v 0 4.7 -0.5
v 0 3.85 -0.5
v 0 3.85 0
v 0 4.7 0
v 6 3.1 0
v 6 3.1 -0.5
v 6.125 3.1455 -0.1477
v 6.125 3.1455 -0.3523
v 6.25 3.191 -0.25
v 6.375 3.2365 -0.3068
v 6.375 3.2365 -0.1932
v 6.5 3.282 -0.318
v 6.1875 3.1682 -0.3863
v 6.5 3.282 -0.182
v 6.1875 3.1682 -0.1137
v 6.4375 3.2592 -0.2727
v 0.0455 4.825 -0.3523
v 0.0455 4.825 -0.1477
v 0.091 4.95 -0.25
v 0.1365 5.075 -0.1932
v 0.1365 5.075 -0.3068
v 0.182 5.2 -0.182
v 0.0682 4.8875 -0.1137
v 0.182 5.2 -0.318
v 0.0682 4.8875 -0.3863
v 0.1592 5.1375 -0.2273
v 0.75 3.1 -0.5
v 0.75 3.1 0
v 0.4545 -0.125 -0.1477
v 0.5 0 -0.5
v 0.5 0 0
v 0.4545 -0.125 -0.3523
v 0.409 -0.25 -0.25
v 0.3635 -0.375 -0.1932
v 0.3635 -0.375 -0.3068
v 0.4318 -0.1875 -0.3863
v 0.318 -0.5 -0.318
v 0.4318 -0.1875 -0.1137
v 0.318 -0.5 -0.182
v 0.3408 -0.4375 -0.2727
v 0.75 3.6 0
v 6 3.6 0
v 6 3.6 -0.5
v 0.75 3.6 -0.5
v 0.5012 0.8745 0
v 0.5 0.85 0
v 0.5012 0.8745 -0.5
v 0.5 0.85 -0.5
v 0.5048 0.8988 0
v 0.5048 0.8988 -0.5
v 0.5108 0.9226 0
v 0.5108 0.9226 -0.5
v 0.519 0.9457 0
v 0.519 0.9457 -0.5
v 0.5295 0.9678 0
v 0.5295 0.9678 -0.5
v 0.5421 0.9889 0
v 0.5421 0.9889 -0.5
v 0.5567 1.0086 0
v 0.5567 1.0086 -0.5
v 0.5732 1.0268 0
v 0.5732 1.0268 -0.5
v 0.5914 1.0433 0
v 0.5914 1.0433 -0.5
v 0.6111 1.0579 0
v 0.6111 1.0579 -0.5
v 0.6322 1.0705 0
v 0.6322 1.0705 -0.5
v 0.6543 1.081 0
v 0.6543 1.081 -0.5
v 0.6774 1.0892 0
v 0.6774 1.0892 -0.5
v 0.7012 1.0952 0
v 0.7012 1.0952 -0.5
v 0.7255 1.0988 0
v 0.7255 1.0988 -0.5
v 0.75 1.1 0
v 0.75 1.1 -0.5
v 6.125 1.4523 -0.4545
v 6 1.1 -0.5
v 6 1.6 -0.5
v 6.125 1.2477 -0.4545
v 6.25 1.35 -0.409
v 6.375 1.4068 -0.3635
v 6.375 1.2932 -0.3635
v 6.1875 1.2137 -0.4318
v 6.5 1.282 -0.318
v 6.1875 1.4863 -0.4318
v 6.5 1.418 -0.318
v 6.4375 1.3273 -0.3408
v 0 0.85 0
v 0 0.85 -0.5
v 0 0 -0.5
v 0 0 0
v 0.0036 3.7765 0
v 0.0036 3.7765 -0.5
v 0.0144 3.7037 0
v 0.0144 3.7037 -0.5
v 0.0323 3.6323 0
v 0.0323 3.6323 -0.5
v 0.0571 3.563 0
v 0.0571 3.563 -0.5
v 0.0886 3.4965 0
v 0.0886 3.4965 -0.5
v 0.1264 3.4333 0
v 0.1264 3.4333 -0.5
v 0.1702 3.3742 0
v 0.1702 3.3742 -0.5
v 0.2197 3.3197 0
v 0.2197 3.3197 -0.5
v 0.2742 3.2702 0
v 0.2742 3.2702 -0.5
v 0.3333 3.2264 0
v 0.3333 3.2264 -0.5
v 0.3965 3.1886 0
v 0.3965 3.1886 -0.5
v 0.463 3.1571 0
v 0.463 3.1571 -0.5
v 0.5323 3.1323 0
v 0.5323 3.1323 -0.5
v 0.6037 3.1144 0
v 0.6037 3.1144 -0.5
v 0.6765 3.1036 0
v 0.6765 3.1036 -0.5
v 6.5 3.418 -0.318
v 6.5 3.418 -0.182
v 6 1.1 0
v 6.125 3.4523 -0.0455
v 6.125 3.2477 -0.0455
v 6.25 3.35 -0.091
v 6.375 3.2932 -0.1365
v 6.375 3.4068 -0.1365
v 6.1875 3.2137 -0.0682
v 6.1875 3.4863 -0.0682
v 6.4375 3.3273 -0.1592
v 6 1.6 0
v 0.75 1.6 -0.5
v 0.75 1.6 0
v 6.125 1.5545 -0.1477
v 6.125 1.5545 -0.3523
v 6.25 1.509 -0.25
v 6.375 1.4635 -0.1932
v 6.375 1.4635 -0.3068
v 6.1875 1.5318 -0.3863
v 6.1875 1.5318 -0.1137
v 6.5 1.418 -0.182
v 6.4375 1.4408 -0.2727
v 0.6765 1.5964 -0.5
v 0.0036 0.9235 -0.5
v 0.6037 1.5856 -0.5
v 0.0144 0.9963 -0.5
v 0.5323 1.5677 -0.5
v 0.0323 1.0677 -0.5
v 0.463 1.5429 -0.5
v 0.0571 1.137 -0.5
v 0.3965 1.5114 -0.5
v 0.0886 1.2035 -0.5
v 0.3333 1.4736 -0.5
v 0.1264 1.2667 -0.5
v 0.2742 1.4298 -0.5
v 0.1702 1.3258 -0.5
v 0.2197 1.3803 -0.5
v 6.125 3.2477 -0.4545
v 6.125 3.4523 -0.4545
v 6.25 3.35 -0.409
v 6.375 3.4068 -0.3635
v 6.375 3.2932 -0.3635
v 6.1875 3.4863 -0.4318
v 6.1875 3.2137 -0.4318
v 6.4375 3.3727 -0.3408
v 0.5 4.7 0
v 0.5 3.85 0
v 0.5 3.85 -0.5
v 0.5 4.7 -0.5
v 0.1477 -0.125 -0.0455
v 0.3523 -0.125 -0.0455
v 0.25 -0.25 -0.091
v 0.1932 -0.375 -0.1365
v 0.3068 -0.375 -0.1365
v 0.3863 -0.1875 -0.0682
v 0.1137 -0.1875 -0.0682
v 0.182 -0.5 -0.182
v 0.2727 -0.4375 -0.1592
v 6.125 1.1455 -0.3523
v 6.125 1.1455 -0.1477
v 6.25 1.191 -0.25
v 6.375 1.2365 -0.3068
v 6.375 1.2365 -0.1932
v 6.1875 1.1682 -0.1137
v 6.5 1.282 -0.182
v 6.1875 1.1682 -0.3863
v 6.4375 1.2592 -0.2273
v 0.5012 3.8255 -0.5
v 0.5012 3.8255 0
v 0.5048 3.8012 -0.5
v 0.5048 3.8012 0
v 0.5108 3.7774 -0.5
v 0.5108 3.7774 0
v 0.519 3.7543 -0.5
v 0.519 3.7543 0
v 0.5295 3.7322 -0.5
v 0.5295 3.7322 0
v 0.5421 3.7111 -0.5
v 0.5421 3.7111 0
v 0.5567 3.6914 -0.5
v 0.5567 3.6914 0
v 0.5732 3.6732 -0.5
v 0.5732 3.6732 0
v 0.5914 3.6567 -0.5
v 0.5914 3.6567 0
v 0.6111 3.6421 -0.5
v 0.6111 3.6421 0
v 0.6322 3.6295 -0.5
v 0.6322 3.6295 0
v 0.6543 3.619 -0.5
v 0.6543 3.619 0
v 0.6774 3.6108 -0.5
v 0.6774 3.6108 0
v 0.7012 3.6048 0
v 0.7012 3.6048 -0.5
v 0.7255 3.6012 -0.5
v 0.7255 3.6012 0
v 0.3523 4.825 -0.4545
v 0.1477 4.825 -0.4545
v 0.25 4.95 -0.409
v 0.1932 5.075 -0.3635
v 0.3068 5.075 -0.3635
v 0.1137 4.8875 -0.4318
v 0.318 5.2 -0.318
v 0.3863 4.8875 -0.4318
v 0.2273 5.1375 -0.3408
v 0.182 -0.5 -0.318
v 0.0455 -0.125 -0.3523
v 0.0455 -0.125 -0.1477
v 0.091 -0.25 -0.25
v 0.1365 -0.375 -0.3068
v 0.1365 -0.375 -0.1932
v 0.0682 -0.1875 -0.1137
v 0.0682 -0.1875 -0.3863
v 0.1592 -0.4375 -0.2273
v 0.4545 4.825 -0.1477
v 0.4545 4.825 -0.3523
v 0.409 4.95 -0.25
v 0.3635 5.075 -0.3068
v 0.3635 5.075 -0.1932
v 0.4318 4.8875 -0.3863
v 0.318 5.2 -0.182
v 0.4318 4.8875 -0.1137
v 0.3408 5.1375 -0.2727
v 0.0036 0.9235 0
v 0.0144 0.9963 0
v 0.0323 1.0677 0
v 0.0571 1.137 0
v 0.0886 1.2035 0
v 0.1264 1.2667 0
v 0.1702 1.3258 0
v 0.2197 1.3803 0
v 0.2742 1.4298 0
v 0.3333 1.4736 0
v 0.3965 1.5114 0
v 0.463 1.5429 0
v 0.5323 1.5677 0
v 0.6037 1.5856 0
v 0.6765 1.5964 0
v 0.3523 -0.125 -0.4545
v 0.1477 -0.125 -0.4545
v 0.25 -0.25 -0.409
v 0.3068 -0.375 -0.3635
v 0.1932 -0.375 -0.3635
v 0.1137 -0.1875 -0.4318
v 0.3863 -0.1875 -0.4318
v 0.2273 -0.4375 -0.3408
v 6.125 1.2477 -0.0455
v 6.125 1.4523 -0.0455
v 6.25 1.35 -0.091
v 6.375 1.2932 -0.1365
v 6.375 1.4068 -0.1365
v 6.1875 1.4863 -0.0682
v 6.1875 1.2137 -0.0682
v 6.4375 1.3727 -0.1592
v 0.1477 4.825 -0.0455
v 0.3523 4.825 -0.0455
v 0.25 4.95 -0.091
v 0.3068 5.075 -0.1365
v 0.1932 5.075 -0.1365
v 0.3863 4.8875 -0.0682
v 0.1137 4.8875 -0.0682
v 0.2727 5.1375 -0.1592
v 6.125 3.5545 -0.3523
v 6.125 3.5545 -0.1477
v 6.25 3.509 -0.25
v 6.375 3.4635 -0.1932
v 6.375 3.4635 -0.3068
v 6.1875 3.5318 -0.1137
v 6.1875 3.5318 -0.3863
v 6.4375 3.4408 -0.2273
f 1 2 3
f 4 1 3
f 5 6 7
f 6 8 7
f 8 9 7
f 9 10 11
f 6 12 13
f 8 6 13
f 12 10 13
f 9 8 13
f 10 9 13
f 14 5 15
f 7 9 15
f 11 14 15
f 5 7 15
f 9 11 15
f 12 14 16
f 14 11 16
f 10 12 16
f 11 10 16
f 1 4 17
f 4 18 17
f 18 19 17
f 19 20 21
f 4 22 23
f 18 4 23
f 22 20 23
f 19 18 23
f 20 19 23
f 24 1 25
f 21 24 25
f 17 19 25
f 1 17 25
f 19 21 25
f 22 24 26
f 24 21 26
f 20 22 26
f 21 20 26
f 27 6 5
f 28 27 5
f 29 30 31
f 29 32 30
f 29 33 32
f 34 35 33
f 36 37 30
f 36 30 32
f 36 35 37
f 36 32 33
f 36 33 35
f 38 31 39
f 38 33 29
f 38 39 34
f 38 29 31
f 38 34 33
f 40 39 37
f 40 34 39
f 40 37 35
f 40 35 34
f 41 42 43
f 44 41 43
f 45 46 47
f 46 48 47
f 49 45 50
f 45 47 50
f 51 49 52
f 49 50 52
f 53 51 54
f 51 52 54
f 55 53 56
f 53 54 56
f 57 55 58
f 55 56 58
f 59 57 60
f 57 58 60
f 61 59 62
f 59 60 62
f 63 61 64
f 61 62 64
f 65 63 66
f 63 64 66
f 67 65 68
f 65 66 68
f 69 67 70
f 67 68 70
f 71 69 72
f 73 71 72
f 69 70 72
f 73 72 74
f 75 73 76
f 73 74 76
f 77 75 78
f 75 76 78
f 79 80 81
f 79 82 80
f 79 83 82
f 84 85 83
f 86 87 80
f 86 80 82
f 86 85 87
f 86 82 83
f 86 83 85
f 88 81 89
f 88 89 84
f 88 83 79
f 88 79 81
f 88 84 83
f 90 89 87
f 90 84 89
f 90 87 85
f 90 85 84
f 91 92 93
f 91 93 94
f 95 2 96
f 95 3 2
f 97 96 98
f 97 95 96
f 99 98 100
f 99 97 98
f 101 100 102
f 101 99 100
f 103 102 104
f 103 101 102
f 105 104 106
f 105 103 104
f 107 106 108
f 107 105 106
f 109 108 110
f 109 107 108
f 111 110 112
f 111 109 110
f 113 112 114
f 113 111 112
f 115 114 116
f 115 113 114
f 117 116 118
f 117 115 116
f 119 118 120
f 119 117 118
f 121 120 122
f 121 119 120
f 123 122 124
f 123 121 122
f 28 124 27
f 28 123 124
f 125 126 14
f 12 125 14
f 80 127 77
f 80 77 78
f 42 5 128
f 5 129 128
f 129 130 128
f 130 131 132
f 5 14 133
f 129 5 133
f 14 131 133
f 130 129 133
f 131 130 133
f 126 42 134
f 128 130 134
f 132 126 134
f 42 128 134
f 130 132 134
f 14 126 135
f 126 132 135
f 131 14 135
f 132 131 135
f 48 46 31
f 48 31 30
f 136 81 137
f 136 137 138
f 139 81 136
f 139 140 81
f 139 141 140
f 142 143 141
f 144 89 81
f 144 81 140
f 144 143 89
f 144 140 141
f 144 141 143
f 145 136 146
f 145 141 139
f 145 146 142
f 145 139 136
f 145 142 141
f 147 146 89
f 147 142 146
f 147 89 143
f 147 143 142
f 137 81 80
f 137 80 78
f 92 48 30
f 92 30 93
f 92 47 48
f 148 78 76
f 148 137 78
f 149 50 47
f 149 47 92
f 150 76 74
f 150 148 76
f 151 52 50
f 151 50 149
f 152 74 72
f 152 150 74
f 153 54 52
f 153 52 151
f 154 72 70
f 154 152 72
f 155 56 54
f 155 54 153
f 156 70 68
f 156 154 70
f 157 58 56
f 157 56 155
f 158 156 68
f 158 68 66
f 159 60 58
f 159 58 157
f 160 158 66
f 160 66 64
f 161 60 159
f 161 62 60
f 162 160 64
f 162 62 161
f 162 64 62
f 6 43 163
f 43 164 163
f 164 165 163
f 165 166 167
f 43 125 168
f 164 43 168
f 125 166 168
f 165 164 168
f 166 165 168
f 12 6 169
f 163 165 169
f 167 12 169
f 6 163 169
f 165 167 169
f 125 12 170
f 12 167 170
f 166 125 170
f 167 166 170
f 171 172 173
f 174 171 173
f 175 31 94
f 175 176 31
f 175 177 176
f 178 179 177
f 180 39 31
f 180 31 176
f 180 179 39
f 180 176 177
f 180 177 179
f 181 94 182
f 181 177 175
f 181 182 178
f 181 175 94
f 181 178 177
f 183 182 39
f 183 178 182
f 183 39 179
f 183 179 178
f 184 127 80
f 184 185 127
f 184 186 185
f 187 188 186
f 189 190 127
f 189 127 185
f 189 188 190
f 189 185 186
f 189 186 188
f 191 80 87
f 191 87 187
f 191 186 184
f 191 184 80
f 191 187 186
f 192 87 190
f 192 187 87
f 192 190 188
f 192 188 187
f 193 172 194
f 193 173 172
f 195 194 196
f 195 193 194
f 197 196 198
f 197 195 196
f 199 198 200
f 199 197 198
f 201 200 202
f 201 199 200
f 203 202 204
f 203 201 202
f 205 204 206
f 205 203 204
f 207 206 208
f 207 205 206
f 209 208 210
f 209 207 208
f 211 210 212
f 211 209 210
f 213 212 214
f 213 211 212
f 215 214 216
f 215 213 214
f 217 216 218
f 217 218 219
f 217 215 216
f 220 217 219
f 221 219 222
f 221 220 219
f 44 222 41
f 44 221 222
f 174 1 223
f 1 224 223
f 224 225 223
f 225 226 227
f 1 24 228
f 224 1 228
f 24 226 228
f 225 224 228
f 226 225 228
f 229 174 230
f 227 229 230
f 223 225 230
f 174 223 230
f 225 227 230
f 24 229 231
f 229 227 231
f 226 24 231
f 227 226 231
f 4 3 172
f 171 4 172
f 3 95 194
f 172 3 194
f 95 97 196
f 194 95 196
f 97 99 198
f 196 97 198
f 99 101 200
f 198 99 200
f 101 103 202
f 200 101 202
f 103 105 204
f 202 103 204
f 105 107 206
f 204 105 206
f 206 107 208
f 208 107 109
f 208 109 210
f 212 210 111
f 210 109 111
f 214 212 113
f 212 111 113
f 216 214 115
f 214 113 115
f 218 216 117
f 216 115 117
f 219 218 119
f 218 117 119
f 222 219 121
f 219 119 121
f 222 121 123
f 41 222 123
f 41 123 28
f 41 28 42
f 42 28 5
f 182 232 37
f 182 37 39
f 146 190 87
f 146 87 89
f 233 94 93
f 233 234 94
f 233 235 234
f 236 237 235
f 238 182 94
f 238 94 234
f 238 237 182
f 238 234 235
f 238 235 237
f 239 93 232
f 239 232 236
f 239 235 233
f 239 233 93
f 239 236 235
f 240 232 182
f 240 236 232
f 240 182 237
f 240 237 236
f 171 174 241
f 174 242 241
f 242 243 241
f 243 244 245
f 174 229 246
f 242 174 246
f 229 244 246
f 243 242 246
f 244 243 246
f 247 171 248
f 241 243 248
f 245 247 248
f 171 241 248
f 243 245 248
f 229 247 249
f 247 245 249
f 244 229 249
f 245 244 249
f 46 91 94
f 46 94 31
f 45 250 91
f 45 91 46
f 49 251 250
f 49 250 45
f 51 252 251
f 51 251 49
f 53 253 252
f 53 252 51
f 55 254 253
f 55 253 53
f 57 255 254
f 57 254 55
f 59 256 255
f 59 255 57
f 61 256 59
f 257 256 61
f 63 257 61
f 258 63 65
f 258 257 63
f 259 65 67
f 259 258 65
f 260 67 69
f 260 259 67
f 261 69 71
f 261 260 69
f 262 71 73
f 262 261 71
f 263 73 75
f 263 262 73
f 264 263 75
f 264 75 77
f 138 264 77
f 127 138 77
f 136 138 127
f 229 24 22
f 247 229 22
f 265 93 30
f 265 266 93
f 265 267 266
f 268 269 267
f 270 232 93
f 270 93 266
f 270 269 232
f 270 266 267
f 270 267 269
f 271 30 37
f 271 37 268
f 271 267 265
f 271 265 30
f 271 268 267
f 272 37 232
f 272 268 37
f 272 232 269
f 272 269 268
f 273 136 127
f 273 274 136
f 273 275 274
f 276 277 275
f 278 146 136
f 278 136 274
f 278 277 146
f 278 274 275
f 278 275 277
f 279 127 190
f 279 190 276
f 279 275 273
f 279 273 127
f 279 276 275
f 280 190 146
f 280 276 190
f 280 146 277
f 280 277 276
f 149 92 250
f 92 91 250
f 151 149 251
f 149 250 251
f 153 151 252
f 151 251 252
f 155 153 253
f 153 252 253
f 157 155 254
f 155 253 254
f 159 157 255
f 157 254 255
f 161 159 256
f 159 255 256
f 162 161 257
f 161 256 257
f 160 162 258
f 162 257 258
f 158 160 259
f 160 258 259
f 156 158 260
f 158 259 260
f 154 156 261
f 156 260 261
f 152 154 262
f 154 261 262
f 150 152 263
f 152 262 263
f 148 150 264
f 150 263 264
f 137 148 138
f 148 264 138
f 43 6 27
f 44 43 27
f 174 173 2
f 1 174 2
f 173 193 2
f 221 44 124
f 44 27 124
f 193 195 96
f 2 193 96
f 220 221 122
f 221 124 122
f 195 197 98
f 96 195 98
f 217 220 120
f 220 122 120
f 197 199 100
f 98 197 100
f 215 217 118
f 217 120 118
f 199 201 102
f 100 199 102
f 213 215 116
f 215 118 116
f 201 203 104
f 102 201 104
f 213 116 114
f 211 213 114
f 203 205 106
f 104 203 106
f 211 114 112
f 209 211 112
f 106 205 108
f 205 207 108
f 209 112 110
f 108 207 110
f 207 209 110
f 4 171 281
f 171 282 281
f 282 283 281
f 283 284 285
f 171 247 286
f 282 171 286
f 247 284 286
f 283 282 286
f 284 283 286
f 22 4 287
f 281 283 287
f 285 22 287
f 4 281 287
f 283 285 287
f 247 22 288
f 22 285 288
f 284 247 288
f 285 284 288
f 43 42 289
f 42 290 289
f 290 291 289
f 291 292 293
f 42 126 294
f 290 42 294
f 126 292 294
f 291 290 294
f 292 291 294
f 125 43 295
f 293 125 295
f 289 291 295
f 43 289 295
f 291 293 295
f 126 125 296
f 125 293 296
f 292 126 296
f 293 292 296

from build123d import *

# Parameters (mm, degrees)
SKETCH1_W           = 0.5
SKETCH1_H           = 0.5
SKETCH6_W           = 0.5
SKETCH6_H           = 0.5
BOSS_EXTRUDE1_DEPTH = 0.5
BOSS_EXTRUDE1_TAPER = 20
SKETCH7_W           = 0.5
SKETCH7_H           = 0.5
BOSS_EXTRUDE2_DEPTH = 0.5
BOSS_EXTRUDE2_TAPER = 20


with BuildPart() as part:
    # Sweep4: sweep along a path in Sketch2
    with BuildLine(Plane.XY) as sweep4_path:
        Line((0.25, 0), (0.25, 0.85))
        ThreePointArc((0.25, 0.85), (0.396446609, 1.203553391), (0.75, 1.35))
        Line((0.75, 1.35), (6, 1.35))
    # Sketch1 → Sweep4 (sweep)
    with BuildSketch(Plane(origin=(0, 0, 0), x_dir=(1, 0, 0), z_dir=(0, 1, 0))):
        with Locations((0.25, 0.25)):
            Rectangle(SKETCH1_W, SKETCH1_H)
    sweep(path=sweep4_path.line)

    # Sketch6 → Boss-Extrude1 (add)
    with BuildSketch(Plane(origin=(6, 0, 0), x_dir=(0, 0, -1), z_dir=(1, 0, 0))):
        with Locations((0.25, 1.35)):
            Rectangle(SKETCH6_W, SKETCH6_H)
    extrude(amount=BOSS_EXTRUDE1_DEPTH, taper=BOSS_EXTRUDE1_TAPER)

    # Sketch7 → Boss-Extrude2 (add)
    with BuildSketch(Plane.XZ):
        with Locations((0.25, -0.25)):
            Rectangle(SKETCH7_W, SKETCH7_H)
    extrude(amount=BOSS_EXTRUDE2_DEPTH, taper=BOSS_EXTRUDE2_TAPER)


with BuildPart() as body_2:
    # Mirror3: mirrored copy
    add(part.part.mirror(Plane.ZX.offset(2.35)))


solid = Compound([part.part, body_2.part])
